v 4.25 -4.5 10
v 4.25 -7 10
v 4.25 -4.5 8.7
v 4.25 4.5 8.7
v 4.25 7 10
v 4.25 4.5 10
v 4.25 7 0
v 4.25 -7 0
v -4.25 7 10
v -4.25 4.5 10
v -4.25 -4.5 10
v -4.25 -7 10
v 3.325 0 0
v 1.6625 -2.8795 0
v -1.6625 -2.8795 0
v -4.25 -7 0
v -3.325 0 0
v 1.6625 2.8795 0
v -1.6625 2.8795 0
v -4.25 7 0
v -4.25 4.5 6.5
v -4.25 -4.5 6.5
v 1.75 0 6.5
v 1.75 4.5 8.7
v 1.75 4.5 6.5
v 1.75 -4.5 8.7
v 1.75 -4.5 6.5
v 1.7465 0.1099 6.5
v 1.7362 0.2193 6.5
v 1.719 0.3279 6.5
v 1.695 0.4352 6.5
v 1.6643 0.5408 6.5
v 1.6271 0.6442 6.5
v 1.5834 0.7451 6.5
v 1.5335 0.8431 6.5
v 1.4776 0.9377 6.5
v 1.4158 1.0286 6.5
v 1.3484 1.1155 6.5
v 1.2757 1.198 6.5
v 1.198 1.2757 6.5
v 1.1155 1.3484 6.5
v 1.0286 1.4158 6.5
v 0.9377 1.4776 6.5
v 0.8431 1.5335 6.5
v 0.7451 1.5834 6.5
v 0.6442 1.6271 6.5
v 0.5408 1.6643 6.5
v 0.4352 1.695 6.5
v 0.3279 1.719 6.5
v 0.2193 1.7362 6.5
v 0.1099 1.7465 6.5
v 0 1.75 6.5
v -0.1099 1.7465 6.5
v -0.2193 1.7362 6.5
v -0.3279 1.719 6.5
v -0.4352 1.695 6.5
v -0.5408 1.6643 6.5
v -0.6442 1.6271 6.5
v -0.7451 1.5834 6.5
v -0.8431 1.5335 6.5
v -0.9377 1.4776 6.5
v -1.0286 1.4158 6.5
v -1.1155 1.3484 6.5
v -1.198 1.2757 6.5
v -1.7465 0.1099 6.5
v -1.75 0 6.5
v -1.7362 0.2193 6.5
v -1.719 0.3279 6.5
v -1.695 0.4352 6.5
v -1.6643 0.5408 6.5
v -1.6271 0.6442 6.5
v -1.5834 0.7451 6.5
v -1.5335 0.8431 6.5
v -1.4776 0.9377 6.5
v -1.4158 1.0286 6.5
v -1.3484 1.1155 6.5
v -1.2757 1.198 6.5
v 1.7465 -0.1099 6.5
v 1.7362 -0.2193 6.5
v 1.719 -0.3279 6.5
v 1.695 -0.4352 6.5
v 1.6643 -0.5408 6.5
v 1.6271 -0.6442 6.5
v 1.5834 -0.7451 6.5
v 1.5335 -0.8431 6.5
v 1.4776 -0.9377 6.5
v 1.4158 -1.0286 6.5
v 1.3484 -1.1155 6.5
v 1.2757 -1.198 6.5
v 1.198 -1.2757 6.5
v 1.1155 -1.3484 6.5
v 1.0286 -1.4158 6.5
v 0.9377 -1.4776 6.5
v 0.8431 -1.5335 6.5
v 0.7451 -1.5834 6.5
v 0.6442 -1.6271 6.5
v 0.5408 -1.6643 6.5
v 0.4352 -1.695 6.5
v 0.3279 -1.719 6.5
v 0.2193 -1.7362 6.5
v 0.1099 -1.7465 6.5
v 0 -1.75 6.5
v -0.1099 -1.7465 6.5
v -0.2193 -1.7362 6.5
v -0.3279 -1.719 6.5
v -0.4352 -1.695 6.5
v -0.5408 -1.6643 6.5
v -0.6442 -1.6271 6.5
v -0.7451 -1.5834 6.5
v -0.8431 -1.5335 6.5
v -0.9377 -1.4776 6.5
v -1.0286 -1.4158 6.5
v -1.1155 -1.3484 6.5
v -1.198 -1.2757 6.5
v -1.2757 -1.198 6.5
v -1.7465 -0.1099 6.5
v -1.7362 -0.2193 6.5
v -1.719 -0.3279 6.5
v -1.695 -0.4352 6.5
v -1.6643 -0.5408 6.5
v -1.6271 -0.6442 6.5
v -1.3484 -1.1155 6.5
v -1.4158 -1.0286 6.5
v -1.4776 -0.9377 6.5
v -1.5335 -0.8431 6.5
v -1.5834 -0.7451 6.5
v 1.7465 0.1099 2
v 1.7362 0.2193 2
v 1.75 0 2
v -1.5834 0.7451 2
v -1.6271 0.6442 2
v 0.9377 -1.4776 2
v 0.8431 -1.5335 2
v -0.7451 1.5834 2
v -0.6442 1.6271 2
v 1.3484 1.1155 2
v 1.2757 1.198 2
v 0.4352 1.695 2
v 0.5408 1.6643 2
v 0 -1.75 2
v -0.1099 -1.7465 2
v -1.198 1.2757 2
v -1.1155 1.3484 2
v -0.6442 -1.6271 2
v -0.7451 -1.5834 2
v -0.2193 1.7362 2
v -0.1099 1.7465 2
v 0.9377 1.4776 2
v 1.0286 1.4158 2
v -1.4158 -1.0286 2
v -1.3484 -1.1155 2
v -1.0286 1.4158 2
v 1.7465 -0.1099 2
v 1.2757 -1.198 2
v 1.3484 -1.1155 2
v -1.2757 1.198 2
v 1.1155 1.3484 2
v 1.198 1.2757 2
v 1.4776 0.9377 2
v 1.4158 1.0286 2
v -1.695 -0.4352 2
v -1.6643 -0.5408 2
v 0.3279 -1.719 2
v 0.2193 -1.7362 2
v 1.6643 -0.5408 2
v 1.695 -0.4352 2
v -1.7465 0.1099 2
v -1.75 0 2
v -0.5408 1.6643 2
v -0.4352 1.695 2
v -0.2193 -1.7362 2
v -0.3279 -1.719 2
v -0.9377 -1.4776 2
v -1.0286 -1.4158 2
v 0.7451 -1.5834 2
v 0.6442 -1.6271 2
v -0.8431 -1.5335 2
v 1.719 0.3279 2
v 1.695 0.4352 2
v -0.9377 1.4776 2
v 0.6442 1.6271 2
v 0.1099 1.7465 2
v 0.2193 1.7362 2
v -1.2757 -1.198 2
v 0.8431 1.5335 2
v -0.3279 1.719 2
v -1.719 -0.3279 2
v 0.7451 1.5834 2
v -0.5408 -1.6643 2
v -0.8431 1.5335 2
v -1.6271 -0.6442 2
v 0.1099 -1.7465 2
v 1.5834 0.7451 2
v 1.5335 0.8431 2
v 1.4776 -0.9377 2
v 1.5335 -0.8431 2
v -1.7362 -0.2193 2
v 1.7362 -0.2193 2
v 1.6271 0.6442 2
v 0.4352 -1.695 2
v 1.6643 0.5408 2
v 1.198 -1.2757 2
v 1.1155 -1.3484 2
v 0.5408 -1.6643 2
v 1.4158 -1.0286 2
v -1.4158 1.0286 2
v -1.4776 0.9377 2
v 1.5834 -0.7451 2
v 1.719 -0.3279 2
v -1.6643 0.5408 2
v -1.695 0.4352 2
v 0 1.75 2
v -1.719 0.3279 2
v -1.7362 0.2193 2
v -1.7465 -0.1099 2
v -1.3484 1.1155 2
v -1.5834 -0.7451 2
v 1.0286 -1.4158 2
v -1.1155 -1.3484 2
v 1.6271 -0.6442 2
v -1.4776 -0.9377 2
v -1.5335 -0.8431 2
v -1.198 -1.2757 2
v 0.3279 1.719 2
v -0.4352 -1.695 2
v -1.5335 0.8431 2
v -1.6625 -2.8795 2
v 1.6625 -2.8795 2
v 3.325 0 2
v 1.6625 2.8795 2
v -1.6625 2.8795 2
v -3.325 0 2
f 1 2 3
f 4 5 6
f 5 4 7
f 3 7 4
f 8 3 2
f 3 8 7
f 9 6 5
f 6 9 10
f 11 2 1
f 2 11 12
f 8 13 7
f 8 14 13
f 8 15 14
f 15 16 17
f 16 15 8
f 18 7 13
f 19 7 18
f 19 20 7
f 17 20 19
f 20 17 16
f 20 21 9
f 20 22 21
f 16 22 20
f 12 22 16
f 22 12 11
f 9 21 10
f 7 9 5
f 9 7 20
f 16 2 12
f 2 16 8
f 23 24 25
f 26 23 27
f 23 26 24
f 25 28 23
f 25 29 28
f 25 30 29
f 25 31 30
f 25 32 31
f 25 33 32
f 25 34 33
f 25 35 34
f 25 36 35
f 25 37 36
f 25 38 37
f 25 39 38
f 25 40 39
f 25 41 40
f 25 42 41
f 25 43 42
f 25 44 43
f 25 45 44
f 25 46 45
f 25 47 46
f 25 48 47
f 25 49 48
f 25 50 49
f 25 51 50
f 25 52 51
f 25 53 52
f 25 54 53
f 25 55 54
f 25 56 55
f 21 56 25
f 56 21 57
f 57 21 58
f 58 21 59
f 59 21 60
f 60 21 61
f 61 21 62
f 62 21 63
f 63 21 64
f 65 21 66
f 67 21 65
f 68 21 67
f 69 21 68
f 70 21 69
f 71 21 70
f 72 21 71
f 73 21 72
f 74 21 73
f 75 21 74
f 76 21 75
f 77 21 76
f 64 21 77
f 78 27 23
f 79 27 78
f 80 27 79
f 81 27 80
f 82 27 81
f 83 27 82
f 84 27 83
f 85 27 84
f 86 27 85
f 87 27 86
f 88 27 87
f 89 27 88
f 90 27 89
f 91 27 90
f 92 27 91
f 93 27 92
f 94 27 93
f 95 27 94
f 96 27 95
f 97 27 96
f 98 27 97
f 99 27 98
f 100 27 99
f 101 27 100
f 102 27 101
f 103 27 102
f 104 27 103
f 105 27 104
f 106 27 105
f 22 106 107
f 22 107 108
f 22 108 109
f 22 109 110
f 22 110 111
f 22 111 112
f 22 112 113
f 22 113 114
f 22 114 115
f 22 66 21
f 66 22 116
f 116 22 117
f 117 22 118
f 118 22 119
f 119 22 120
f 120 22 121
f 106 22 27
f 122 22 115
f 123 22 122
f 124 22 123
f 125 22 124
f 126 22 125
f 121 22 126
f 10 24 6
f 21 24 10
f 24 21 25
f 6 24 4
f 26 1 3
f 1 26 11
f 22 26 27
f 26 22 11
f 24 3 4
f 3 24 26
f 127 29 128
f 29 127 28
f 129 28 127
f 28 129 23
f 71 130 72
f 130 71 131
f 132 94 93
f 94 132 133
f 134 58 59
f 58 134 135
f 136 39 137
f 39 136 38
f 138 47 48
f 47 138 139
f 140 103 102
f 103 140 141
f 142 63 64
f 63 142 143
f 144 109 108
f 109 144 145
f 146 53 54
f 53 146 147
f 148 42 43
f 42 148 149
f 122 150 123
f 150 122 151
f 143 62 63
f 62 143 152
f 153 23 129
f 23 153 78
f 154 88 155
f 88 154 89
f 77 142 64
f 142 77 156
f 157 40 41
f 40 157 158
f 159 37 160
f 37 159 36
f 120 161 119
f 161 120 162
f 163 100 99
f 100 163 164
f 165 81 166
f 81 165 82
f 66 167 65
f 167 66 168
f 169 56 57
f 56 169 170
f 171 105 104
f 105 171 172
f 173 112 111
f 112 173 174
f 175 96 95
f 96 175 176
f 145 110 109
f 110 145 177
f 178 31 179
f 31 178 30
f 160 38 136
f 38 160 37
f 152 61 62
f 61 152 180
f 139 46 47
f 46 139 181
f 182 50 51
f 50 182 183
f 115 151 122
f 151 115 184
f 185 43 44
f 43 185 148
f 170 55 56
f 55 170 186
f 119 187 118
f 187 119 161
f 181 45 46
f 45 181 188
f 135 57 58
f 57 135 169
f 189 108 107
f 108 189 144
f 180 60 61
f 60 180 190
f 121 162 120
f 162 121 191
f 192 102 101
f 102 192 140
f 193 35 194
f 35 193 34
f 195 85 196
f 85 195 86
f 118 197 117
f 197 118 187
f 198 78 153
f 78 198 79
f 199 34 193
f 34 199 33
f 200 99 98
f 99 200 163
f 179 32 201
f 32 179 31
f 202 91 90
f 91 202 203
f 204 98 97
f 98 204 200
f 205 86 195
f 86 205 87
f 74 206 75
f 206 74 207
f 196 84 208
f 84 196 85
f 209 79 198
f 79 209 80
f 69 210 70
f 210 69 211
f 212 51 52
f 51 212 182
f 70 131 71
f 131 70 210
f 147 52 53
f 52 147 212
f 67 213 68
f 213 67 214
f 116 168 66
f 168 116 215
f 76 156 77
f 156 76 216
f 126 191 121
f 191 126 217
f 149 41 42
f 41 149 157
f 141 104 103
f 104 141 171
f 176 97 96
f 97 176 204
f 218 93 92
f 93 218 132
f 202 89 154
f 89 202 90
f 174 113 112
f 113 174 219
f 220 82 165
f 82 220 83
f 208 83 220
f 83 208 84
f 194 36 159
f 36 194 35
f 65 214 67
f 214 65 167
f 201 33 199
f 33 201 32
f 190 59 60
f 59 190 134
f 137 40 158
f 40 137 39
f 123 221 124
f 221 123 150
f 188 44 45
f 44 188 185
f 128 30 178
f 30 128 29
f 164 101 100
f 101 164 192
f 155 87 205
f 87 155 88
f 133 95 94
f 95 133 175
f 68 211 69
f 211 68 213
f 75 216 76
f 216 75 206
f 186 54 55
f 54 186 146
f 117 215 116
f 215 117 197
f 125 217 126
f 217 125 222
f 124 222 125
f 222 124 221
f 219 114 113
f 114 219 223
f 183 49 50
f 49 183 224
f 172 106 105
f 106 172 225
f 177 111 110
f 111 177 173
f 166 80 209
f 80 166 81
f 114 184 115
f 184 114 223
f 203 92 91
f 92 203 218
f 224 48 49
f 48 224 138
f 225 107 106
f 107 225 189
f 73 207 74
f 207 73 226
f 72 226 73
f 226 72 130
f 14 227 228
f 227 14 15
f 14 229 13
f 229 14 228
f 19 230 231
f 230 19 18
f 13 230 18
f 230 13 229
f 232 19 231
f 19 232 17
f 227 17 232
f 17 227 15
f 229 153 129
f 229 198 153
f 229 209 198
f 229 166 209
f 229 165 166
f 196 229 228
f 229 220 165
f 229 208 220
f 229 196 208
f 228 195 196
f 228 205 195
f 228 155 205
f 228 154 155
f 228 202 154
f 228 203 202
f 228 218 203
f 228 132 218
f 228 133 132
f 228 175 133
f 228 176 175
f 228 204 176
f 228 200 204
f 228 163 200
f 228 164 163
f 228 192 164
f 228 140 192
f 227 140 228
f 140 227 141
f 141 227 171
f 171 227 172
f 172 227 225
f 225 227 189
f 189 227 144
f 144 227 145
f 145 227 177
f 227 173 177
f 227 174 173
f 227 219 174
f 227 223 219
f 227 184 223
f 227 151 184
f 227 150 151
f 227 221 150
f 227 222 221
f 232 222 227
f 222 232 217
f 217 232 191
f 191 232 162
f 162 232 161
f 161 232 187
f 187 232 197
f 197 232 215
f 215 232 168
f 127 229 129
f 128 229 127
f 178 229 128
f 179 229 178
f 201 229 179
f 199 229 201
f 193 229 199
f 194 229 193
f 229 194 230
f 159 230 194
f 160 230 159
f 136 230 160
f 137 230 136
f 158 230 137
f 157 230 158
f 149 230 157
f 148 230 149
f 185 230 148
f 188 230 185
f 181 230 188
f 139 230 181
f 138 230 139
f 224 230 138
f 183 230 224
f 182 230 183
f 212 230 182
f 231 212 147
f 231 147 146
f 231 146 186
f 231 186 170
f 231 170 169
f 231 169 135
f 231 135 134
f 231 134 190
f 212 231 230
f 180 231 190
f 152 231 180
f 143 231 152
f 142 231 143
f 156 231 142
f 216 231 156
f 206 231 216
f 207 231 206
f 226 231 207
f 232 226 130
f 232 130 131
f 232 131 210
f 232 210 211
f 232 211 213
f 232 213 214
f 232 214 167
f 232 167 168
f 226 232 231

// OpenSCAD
// file: cube_on_z0.scad
module cube_on_z0 (width, height, thickness) {
    translate(v = [0,0,thickness/2]) {
        cube([width
             ,height
             ,thickness]
            ,center=true);
    }
}
// main file
use <cube_on_z0.scad>

$fn = 100;


module claw_mount(
    claw_hole_width  = 9,
    claw_hole_depth  = 6,
    claw_hole_height = 4,
    claw_hole_offset = 2.2,
    wall_thickness   = 2.5,
    total_height     = 10,
    screw_diameter   = 3.5,
    nut_diameter     = 6.65,
    nut_thickness    = 4
) {

    base_z = nut_thickness + wall_thickness;
    total_y_size = claw_hole_width + 2 * wall_thickness;
    total_x_size = claw_hole_depth + wall_thickness;

    difference() {
        cube_on_z0(width = total_x_size, height = total_y_size, thickness = total_height);


        // Access hole
        translate(v = [-wall_thickness, 0, base_z]) {
            cube_on_z0(width = total_x_size, height = total_y_size - 2 * wall_thickness, thickness = total_height);
        }

        // Claw hole
        translate(v = [wall_thickness, 0, base_z+claw_hole_offset]) {
            cube_on_z0(width = total_x_size, height = claw_hole_width, thickness = claw_hole_height);
        }

        // Screw hole
        cylinder(h = total_height+2*wall_thickness, r = screw_diameter/2, center = true);

        // Nut hole
        cylinder(h = nut_thickness, r = nut_diameter/2, center = true, $fn = 6);
    }
}

// Preview example
// Uncomment to visualize:
claw_mount();
